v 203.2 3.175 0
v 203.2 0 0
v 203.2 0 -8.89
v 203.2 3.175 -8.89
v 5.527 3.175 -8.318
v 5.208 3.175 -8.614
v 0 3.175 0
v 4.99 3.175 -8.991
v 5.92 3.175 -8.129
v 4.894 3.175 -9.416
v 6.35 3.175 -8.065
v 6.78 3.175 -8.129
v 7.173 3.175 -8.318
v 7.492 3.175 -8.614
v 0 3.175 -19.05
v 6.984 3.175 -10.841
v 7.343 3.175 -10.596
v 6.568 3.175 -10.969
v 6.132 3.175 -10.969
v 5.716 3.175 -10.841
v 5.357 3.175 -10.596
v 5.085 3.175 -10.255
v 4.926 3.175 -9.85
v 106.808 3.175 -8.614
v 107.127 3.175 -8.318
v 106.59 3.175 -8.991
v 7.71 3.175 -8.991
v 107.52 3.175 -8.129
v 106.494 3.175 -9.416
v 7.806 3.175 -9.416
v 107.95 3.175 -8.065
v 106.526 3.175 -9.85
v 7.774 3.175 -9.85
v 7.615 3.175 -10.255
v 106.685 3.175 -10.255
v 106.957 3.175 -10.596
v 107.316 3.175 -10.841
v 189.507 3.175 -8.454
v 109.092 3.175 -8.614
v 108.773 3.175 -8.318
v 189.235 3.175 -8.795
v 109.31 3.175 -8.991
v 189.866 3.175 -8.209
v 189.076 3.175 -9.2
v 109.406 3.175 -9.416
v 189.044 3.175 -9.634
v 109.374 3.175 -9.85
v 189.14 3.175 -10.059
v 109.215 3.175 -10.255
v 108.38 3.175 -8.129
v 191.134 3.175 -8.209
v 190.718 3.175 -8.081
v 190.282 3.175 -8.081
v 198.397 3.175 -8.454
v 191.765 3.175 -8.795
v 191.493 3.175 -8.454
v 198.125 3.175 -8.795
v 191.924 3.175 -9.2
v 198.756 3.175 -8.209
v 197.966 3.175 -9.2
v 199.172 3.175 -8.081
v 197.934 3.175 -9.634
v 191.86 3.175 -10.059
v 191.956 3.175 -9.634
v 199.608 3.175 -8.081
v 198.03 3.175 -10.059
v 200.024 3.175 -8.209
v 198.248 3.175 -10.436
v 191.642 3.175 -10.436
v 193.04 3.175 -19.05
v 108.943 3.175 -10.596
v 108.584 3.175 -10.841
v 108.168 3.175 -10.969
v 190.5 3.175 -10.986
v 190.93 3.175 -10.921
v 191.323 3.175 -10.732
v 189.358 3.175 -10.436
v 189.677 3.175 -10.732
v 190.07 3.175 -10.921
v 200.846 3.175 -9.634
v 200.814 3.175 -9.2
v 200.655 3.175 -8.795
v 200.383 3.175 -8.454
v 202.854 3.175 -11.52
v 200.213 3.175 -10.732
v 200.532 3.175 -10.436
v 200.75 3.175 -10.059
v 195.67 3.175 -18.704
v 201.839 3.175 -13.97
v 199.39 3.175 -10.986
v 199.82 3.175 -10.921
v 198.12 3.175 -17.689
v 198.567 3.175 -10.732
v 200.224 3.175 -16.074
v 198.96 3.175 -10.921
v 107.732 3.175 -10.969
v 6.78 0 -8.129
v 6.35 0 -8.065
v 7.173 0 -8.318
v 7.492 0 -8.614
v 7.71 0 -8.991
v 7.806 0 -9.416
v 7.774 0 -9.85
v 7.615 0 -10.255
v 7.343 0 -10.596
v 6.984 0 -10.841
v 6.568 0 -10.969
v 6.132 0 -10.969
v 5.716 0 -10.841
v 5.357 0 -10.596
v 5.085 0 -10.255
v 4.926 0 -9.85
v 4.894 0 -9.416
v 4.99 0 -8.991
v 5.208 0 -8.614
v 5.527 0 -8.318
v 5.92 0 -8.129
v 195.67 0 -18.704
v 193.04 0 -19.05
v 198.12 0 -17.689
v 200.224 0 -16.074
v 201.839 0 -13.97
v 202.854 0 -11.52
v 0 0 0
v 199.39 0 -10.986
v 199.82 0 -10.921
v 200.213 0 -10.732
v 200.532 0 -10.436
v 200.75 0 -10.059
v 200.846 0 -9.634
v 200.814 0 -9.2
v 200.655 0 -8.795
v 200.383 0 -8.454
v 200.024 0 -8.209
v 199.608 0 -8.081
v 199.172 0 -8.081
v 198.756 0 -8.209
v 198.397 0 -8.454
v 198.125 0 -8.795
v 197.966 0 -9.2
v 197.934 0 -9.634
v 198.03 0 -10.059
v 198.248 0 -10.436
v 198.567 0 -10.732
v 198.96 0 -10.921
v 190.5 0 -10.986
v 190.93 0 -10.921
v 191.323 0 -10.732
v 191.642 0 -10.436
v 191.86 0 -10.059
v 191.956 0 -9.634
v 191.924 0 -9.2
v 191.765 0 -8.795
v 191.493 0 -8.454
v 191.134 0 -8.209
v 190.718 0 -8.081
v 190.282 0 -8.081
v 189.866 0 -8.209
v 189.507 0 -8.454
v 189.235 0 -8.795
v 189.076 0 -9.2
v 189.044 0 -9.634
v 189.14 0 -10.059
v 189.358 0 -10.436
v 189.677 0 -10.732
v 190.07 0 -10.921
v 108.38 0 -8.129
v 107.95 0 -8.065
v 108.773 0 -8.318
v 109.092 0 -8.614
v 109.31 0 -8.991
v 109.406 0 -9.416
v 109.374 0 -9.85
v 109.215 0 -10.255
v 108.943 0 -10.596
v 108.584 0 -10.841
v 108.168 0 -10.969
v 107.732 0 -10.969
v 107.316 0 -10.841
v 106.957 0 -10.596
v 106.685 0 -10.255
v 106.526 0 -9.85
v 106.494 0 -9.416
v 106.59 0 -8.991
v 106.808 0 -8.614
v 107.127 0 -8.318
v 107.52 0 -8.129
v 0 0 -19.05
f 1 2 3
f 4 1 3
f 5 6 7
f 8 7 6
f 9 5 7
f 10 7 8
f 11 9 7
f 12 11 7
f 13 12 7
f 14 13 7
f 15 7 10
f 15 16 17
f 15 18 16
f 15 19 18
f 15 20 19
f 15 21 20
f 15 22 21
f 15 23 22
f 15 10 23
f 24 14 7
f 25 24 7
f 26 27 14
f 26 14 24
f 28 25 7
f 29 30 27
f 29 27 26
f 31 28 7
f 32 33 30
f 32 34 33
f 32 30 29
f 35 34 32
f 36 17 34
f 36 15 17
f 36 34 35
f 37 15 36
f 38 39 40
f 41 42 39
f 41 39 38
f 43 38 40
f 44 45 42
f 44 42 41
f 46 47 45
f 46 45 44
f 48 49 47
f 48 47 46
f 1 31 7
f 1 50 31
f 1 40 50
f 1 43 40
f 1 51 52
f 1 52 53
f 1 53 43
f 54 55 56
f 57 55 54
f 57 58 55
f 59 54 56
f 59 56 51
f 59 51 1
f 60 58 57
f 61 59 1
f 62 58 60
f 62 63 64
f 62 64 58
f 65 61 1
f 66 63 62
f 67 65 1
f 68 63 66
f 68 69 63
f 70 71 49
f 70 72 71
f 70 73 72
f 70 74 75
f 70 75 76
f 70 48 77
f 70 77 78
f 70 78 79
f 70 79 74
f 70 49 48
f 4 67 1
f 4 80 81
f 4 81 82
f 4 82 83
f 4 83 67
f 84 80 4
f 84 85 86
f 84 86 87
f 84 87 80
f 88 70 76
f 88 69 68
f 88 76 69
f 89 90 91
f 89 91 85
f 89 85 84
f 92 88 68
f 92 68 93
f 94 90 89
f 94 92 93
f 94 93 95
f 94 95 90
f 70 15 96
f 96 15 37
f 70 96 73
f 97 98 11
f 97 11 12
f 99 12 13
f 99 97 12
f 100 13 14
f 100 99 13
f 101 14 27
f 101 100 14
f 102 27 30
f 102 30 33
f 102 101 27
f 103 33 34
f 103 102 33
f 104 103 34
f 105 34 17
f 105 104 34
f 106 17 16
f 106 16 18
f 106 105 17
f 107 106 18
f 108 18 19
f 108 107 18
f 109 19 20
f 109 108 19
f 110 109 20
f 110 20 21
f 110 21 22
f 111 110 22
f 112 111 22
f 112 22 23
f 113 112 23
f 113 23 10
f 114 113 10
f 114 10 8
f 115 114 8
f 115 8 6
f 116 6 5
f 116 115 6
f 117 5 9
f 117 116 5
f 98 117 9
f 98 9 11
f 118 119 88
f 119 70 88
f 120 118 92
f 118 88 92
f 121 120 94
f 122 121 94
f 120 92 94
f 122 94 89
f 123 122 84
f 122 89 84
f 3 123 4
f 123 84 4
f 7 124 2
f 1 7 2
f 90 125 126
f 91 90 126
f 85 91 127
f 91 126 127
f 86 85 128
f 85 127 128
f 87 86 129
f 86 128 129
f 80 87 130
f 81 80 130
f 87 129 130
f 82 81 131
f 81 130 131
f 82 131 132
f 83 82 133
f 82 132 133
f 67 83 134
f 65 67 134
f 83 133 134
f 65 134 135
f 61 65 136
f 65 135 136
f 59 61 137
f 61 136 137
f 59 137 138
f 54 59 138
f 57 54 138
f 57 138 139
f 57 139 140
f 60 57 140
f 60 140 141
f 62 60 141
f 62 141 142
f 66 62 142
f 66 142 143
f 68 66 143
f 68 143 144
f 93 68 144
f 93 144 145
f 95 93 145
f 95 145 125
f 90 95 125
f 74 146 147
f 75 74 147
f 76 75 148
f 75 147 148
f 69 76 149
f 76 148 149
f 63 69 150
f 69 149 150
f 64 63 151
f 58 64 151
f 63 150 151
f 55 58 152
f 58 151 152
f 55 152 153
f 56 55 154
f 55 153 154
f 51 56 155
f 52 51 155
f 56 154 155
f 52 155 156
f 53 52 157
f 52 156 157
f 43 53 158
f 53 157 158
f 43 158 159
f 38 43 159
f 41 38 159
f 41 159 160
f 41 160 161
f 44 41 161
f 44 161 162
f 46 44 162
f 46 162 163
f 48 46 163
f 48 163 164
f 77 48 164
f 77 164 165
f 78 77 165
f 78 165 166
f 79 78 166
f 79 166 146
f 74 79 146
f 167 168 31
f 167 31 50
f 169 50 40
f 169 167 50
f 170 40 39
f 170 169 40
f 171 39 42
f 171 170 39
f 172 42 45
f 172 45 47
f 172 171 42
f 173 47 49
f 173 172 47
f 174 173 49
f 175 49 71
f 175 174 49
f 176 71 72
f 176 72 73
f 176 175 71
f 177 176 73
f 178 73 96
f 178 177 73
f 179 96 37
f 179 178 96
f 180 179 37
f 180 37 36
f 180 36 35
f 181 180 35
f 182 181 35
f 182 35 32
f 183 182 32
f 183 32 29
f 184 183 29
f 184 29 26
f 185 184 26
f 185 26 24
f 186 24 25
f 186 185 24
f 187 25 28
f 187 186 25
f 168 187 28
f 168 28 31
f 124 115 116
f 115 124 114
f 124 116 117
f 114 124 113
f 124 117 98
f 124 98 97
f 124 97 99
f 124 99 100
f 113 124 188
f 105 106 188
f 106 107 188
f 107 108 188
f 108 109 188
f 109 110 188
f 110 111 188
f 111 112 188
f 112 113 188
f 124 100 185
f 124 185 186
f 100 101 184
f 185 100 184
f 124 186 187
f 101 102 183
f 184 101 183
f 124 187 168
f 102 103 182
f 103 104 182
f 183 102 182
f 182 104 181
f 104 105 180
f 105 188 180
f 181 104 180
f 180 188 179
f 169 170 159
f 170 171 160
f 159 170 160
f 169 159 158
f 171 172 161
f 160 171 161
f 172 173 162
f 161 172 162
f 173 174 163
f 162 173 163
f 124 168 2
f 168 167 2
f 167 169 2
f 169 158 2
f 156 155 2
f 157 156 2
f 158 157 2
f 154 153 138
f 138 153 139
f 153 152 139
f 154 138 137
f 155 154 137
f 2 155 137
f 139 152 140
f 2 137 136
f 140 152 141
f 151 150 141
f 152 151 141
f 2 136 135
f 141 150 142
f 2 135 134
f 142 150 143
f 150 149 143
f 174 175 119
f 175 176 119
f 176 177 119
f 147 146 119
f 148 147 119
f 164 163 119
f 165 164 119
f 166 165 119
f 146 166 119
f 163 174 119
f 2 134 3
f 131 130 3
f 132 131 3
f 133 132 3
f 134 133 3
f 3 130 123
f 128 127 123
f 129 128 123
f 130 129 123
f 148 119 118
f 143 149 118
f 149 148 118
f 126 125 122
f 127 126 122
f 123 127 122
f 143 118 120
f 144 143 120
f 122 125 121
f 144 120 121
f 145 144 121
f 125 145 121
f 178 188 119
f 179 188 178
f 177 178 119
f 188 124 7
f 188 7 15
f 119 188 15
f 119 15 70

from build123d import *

# Parameters (mm, degrees)
SKETCH1_W           = 203.2
SKETCH1_H           = 19.05
SKETCH1_R           = 1.4605
BOSS_EXTRUDE1_DEPTH = 3.175
SKETCH2_R           = 1.4605
CUT_EXTRUDE1_DEPTH  = 205.115710138
FILLET1_R           = 10.16


with BuildPart() as part:
    # Sketch1 → Boss-Extrude1 (new body)
    with BuildSketch(Plane(origin=(0, 0, 0), x_dir=(1, 0, 0), z_dir=(0, 1, 0))):
        with Locations((101.6, 9.525)):
            Rectangle(SKETCH1_W, SKETCH1_H)
        with Locations(Location((6.35, 9.525, 0), (0, 0, 270))):
            Circle(SKETCH1_R, mode=Mode.SUBTRACT)
        with Locations(Location((107.95, 9.525, 0), (0, 0, 270))):
            Circle(SKETCH1_R, mode=Mode.SUBTRACT)
    extrude(amount=BOSS_EXTRUDE1_DEPTH)

    # Sketch2 → Cut-Extrude1 (cut, through all)
    with BuildSketch(Plane(origin=(0, 0, 0), x_dir=(-1, 0, 0), z_dir=(0, -1, 0))):
        with Locations(Location((-199.39, 9.525, 0), (0, 0, 90))):
            Circle(SKETCH2_R)
        with Locations(Location((-190.5, 9.525, 0), (0, 0, 90))):
            Circle(SKETCH2_R)
    extrude(amount=-CUT_EXTRUDE1_DEPTH, mode=Mode.SUBTRACT)

    # Fillet1
    fillet1_edges = [part.edges().sort_by_distance(p)[0] for p in [
        (203.2, 1.5875, -19.05),
    ]]
    fillet(fillet1_edges, radius=FILLET1_R)


solid = part.part
